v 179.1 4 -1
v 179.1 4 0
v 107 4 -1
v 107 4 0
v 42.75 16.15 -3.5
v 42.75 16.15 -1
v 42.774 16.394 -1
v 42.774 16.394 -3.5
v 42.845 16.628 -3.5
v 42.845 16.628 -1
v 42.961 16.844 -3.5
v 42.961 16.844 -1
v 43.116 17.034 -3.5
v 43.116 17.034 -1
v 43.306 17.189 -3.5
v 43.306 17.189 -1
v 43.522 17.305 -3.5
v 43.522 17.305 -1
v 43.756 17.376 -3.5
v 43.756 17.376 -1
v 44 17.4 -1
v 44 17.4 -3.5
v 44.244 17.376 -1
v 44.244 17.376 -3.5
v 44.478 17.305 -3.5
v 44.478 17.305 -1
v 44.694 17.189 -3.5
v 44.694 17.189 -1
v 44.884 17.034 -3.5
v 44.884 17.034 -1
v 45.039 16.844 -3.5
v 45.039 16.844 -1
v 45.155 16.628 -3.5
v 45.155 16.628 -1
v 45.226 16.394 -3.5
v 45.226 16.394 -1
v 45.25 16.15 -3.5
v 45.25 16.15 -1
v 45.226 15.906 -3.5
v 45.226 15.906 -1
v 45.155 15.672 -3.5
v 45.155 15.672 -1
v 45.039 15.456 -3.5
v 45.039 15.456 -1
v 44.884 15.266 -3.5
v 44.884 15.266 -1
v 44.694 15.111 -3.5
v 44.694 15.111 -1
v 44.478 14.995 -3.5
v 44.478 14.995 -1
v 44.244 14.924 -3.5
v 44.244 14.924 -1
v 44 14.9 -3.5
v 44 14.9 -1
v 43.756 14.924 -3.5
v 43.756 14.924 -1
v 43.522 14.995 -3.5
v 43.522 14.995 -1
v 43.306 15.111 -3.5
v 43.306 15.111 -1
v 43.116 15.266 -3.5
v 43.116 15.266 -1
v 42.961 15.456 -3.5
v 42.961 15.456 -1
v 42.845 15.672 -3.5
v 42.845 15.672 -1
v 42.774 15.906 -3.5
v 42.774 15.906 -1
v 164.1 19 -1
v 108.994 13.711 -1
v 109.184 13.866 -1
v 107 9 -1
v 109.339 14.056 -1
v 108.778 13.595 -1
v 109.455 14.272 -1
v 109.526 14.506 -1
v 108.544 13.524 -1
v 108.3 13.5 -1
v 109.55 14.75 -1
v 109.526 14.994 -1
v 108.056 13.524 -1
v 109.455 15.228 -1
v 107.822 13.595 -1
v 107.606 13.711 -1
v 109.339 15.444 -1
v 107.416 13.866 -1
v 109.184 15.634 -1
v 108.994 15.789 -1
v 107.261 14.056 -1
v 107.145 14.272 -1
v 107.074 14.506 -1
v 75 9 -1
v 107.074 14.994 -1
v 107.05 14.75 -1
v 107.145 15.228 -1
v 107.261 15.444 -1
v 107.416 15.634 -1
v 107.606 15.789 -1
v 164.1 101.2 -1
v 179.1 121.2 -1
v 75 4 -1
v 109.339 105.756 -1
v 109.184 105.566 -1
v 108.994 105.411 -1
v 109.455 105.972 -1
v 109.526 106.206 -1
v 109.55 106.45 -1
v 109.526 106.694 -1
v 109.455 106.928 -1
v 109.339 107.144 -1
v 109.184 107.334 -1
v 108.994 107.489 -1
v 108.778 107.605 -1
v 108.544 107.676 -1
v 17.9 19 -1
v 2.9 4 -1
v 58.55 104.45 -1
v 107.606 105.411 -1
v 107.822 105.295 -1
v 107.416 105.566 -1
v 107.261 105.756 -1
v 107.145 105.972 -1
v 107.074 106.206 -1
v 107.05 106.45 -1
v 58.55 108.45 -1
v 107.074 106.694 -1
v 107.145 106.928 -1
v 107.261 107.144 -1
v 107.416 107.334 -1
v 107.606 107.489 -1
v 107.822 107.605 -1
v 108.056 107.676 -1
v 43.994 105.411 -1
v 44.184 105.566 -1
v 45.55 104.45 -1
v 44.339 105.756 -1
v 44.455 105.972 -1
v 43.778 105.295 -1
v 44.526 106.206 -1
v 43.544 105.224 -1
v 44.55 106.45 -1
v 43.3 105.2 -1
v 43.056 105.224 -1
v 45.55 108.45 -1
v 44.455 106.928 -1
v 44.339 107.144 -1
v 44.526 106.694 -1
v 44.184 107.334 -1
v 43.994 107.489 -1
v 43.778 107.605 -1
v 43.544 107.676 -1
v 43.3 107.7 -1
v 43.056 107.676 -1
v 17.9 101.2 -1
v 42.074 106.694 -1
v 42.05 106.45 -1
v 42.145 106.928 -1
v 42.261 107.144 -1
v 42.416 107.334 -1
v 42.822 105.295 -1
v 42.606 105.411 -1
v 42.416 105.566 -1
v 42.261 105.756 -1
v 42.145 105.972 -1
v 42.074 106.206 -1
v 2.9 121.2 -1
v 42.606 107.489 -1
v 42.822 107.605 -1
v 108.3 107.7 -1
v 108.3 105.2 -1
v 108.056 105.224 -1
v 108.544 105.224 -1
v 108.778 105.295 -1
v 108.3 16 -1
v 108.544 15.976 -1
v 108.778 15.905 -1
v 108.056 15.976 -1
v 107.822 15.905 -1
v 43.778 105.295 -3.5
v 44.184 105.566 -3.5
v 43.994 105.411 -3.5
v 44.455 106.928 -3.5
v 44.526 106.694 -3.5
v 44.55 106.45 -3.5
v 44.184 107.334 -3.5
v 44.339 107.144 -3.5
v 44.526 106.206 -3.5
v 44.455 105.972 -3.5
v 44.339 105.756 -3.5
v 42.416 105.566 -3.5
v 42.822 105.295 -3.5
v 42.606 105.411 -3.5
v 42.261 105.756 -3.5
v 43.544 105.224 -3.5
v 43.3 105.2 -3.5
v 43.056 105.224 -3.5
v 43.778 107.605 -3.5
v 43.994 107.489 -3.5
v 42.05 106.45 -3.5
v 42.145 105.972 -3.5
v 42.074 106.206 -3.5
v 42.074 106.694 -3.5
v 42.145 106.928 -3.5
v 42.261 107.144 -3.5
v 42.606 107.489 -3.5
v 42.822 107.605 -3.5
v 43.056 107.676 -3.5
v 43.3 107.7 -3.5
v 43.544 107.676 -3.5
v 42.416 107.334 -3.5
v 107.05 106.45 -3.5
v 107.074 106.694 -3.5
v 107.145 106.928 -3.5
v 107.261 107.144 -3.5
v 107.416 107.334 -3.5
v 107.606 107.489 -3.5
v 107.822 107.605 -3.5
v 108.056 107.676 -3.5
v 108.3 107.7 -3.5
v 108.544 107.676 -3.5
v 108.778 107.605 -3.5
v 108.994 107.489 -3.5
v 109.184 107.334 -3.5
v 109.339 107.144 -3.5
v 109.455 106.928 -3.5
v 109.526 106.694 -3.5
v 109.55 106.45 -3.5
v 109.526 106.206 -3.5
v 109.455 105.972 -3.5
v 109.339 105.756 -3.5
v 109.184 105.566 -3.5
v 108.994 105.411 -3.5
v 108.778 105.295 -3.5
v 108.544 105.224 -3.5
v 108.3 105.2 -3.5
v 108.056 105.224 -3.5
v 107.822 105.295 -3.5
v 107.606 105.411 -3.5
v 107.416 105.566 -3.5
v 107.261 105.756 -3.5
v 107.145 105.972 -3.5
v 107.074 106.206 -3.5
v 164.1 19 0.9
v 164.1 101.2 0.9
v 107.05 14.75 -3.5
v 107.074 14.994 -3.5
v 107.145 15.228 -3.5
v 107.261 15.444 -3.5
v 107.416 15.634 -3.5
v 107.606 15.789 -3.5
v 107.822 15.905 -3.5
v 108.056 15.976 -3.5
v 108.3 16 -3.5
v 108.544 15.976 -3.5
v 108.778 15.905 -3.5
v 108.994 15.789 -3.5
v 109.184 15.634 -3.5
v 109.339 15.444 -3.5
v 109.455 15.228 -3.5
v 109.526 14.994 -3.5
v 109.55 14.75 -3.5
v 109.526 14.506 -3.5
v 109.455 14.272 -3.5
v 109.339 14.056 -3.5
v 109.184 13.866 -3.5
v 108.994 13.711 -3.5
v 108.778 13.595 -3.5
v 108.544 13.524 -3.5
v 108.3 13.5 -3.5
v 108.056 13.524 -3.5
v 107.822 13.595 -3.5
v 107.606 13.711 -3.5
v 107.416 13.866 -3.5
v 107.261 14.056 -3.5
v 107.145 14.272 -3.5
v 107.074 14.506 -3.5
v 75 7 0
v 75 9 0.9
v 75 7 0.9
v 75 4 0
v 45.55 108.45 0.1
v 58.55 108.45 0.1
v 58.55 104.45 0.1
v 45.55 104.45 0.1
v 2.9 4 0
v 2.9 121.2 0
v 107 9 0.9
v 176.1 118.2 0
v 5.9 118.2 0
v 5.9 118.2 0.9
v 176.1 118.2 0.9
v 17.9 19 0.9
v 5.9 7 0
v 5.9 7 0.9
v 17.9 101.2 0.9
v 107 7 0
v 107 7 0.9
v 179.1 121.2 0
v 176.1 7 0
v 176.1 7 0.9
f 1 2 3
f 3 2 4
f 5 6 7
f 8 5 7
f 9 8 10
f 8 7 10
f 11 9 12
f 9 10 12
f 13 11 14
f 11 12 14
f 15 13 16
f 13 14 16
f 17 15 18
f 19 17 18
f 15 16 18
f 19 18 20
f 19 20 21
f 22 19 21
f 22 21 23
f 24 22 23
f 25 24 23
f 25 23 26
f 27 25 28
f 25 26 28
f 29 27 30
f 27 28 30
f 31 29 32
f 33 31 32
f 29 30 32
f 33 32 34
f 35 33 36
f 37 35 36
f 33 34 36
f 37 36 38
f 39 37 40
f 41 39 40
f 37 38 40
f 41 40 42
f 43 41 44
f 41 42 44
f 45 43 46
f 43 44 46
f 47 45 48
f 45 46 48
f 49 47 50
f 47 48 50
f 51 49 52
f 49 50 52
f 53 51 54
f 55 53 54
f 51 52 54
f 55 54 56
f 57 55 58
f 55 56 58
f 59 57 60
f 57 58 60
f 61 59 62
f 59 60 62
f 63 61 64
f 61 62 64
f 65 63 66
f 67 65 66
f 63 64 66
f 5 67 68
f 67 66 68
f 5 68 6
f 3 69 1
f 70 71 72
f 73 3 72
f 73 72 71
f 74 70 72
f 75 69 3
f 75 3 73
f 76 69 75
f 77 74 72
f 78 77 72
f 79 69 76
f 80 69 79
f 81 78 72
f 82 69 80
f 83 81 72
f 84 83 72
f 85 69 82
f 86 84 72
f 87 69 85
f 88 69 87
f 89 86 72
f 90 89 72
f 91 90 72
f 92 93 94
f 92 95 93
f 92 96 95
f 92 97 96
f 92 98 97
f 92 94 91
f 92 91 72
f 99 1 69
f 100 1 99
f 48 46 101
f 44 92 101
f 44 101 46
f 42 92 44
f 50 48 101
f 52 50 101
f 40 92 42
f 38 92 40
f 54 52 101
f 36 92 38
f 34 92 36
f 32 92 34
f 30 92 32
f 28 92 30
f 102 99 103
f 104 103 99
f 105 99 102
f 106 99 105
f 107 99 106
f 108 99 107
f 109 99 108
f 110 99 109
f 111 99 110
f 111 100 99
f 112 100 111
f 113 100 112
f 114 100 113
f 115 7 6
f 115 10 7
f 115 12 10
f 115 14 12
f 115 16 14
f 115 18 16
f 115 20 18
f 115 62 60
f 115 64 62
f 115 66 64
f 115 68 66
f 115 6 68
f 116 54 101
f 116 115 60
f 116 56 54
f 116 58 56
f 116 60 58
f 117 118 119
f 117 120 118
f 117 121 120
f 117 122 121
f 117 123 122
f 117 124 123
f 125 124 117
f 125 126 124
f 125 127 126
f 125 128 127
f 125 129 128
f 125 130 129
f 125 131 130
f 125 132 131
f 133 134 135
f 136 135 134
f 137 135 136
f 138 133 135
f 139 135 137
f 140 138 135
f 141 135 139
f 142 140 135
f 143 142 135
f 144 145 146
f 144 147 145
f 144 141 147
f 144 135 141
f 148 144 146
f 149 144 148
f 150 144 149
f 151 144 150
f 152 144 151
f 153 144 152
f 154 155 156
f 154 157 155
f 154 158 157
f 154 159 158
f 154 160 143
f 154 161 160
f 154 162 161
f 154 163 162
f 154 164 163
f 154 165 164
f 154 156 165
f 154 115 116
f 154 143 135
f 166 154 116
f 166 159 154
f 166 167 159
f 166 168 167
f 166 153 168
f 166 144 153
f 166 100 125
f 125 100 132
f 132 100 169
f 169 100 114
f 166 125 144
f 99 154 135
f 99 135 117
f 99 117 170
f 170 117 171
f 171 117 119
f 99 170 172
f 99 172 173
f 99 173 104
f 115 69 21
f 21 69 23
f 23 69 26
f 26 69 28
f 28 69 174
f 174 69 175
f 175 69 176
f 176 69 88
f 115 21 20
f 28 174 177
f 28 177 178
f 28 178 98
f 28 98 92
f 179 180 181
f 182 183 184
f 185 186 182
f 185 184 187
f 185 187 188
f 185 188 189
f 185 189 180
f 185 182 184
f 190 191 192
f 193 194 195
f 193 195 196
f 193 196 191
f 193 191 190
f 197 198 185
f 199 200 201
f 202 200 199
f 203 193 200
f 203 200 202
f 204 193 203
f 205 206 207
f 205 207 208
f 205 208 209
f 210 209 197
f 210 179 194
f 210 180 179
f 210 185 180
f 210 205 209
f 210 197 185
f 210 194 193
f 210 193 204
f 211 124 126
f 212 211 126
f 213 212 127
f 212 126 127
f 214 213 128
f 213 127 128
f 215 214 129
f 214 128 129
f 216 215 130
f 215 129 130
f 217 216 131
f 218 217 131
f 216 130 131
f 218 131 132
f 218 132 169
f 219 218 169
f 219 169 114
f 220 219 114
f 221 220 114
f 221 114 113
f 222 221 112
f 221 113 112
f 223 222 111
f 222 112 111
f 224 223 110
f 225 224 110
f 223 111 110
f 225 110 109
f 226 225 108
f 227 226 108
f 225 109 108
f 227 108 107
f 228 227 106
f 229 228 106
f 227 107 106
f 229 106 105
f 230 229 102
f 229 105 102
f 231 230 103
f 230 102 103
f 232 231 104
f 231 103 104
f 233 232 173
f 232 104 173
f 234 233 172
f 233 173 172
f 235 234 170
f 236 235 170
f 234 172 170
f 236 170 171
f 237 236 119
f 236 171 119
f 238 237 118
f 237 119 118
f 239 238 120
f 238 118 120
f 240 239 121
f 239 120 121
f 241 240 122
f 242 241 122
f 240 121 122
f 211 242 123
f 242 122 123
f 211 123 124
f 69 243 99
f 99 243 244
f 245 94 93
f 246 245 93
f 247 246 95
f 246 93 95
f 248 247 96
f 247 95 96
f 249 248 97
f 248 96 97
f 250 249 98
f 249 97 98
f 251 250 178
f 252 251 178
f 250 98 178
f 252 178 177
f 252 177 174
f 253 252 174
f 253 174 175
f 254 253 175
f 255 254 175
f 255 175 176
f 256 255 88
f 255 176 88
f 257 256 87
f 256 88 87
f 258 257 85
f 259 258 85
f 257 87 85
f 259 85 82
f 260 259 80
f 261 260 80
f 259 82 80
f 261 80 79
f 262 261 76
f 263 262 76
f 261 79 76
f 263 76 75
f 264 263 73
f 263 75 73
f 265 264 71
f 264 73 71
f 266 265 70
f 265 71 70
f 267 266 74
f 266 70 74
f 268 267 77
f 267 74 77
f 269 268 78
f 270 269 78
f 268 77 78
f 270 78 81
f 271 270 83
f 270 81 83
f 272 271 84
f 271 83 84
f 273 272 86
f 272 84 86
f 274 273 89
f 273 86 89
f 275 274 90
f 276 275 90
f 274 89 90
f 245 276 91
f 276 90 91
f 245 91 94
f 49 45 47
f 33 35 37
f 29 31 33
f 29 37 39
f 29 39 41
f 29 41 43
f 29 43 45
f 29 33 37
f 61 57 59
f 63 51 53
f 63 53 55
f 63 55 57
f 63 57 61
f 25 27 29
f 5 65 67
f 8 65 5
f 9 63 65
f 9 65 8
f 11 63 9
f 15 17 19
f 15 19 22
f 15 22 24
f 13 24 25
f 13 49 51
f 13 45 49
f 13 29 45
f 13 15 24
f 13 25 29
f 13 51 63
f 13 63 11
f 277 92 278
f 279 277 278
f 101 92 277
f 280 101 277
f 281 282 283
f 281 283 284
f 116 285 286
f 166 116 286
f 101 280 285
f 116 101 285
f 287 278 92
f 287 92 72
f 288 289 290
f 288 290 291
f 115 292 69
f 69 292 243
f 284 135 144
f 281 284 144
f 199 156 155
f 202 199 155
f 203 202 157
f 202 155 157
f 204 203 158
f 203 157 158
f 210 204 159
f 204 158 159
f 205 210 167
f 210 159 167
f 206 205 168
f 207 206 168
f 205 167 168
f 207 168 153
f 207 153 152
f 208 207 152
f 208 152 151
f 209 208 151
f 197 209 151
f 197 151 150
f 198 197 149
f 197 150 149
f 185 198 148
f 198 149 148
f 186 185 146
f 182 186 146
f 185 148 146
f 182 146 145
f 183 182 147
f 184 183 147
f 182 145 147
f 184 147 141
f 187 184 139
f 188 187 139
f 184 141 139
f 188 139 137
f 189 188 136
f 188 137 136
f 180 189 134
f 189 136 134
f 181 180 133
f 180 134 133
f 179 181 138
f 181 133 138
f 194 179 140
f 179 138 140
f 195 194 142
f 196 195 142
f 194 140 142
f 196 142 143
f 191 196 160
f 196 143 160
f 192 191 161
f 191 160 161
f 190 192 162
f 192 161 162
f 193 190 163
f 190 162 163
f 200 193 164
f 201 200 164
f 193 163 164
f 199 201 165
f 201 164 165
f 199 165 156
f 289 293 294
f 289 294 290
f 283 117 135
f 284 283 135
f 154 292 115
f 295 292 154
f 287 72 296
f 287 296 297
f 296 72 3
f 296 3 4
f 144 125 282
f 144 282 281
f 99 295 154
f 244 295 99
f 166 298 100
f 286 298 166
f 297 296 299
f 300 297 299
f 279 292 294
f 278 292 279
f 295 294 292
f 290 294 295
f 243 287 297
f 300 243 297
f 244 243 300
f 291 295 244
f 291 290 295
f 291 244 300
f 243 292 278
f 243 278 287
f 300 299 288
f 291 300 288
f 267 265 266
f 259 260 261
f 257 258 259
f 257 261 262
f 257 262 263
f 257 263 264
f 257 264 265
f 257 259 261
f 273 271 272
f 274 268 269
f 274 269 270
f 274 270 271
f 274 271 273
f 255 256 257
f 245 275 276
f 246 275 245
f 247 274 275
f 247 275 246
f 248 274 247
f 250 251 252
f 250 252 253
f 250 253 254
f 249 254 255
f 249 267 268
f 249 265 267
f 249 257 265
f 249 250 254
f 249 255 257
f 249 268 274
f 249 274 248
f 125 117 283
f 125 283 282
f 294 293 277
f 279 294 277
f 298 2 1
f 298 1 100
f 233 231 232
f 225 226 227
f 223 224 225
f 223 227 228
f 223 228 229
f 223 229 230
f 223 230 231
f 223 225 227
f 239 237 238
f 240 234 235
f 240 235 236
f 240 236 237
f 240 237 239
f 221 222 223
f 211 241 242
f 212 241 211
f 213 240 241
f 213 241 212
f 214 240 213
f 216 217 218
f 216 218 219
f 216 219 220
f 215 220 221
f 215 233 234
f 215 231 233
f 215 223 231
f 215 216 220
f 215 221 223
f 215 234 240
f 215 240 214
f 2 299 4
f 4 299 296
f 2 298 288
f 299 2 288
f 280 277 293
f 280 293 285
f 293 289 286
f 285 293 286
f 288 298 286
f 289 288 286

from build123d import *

# Parameters (mm, degrees)
ESBO_O1_W                = 170.2
ESBO_O1_H                = 111.2
RESSALTO_EXTRUS_O1_DEPTH = 0.9
ESBO_O4_W                = 176.2
ESBO_O4_H                = 117.2
RESSALTO_EXTRUS_O3_DEPTH = 1
ESBO_O5_W                = 32
ESBO_O5_H                = 1.9
CORTE_EXTRUS_O3_DEPTH    = 5
ESBO_O6_R                = 1.25
RESSALTO_EXTRUS_O4_DEPTH = 2.5
ESBO_O10_W               = 13
ESBO_O10_H               = 4
CORTE_EXTRUS_O6_DEPTH    = 1.1
ESBO_O12_W               = 146.2
ESBO_O12_H               = 82.2
CORTE_EXTRUS_O8_DEPTH    = 10


with BuildPart() as part:
    # Esboço1 → Ressalto-extrusão1 (new body)
    with BuildSketch(Plane.XY):
        with Locations((91, 62.6)):
            Rectangle(ESBO_O1_W, ESBO_O1_H)
    extrude(amount=RESSALTO_EXTRUS_O1_DEPTH)

    # Esboço4 → Ressalto-extrusão3 (add)
    with BuildSketch(Plane(origin=(0, 0, 0), x_dir=(-1, 0, 0), z_dir=(0, 0, -1))):
        with Locations((-91, 62.6)):
            Rectangle(ESBO_O4_W, ESBO_O4_H)
    extrude(amount=RESSALTO_EXTRUS_O3_DEPTH)

    # Esboço5 → Corte-extrusão3 (cut)
    with BuildSketch(Plane.XZ.offset(-4)):
        with Locations((91, -0.05)):
            Rectangle(ESBO_O5_W, ESBO_O5_H)
    extrude(amount=-CORTE_EXTRUS_O3_DEPTH, mode=Mode.SUBTRACT)

    # Esboço6 → Ressalto-extrusão4 (add)
    with BuildSketch(Plane(origin=(0, 0, -1), x_dir=(-1, 0, 0), z_dir=(0, 0, -1))):
        with Locations((-108.3, 14.75)):
            Circle(ESBO_O6_R)
        with Locations((-108.3, 106.45)):
            Circle(ESBO_O6_R)
        with Locations((-43.3, 106.45)):
            Circle(ESBO_O6_R)
        with Locations((-44, 16.15)):
            Circle(ESBO_O6_R)
    extrude(amount=RESSALTO_EXTRUS_O4_DEPTH)

    # Esboço10 → Corte-extrusão6 (cut)
    with BuildSketch(Plane(origin=(0, 0, -1), x_dir=(-1, 0, 0), z_dir=(0, 0, -1))):
        with Locations((-52.05, 106.45)):
            Rectangle(ESBO_O10_W, ESBO_O10_H)
    extrude(amount=-CORTE_EXTRUS_O6_DEPTH, mode=Mode.SUBTRACT)

    # Esboço12 → Corte-extrusão8 (cut)
    with BuildSketch(Plane.XY.offset(0.9)):
        with Locations((91, 60.1)):
            Rectangle(ESBO_O12_W, ESBO_O12_H)
    extrude(amount=-CORTE_EXTRUS_O8_DEPTH, mode=Mode.SUBTRACT)


solid = part.part
